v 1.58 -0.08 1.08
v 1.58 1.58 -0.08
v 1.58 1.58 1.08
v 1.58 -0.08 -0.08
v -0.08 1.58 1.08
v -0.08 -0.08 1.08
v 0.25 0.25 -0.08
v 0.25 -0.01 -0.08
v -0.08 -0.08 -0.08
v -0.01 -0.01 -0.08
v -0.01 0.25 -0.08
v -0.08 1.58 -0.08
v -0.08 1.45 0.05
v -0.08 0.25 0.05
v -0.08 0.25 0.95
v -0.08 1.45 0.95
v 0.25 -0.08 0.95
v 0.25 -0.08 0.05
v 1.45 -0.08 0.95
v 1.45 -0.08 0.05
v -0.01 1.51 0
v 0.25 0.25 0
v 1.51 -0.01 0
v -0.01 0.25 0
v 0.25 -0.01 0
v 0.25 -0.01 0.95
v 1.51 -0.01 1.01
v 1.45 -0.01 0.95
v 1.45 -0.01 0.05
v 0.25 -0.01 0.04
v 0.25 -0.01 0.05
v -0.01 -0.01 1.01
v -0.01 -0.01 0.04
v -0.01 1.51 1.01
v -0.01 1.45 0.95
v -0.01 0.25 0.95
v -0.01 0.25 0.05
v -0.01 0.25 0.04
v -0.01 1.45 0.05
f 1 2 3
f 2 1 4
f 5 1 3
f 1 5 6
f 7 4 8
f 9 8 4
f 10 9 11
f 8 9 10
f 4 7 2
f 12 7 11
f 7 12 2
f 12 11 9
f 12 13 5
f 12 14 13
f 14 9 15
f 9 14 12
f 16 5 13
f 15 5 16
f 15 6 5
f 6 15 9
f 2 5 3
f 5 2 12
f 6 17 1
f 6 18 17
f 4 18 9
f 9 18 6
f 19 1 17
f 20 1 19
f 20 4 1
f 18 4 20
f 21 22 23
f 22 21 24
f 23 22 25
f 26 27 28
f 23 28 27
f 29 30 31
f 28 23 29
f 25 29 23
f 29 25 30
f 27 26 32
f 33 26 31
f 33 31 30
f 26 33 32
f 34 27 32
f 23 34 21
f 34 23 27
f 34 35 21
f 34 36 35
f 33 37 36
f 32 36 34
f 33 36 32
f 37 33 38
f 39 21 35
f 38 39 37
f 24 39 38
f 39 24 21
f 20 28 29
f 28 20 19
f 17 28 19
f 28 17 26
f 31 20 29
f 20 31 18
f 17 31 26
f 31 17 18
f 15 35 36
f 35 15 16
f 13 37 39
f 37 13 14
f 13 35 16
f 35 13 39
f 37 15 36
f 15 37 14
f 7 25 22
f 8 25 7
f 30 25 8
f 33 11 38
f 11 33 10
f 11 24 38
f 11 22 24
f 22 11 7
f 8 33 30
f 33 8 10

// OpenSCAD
// Industrial USB Hub Infrastructure - Tape Application Alignment Jig
$fn = 64; 

// Form factor offsets to nest cleanly over the 1.2 in³ Corner Block Base
block_width    = 1.50; // Inches
block_height   = 1.50; // Inches
block_length   = 1.00; // Inches
wall           = 0.08; // 2mm wall thickness for the alignment template frame
tolerance      = 0.01; // Mechanical spacing clearance for easy tool removal

module adhesive_alignment_jig() {
    difference() {
        // 1. Master Exterior Alignment Jig Frame Block
        translate([-wall, -wall, -wall])
            cube([block_width + (wall * 2), block_height + (wall * 2), block_length + (wall * 2)]);
        
        // 2. Main Corner Block Positioning Cavity (Nests the module frame snugly)
        linear_extrude(height = block_length + tolerance) {
            polygon(points=[[-tolerance, -tolerance], 
                            [block_width + tolerance, -tolerance], 
                            [-tolerance, block_height + tolerance]]);
        }
        
        // 3. Bottom Plane Tape Alignment Window
        // Exposes the exact footprint for clean natural rubber-resin tape application
        translate([0.25, -wall - 0.02, 0.05])
            cube([block_width - 0.3, wall + 0.05, block_length - 0.1]);
            
        // 4. Back Plane Tape Alignment Window
        translate([-wall - 0.02, 0.25, 0.05])
            cube([wall + 0.05, block_height - 0.3, block_length - 0.1]);
            
        // 5. Solid Shields over Internal Channels
        // Completely masks the snap-channel and fluid-glue wells from tape placement
        translate([-tolerance, -tolerance, -wall - 0.01])
            cube([0.25 + tolerance, 0.25 + tolerance, wall + 0.05]);
    }
}

adhesive_alignment_jig();
